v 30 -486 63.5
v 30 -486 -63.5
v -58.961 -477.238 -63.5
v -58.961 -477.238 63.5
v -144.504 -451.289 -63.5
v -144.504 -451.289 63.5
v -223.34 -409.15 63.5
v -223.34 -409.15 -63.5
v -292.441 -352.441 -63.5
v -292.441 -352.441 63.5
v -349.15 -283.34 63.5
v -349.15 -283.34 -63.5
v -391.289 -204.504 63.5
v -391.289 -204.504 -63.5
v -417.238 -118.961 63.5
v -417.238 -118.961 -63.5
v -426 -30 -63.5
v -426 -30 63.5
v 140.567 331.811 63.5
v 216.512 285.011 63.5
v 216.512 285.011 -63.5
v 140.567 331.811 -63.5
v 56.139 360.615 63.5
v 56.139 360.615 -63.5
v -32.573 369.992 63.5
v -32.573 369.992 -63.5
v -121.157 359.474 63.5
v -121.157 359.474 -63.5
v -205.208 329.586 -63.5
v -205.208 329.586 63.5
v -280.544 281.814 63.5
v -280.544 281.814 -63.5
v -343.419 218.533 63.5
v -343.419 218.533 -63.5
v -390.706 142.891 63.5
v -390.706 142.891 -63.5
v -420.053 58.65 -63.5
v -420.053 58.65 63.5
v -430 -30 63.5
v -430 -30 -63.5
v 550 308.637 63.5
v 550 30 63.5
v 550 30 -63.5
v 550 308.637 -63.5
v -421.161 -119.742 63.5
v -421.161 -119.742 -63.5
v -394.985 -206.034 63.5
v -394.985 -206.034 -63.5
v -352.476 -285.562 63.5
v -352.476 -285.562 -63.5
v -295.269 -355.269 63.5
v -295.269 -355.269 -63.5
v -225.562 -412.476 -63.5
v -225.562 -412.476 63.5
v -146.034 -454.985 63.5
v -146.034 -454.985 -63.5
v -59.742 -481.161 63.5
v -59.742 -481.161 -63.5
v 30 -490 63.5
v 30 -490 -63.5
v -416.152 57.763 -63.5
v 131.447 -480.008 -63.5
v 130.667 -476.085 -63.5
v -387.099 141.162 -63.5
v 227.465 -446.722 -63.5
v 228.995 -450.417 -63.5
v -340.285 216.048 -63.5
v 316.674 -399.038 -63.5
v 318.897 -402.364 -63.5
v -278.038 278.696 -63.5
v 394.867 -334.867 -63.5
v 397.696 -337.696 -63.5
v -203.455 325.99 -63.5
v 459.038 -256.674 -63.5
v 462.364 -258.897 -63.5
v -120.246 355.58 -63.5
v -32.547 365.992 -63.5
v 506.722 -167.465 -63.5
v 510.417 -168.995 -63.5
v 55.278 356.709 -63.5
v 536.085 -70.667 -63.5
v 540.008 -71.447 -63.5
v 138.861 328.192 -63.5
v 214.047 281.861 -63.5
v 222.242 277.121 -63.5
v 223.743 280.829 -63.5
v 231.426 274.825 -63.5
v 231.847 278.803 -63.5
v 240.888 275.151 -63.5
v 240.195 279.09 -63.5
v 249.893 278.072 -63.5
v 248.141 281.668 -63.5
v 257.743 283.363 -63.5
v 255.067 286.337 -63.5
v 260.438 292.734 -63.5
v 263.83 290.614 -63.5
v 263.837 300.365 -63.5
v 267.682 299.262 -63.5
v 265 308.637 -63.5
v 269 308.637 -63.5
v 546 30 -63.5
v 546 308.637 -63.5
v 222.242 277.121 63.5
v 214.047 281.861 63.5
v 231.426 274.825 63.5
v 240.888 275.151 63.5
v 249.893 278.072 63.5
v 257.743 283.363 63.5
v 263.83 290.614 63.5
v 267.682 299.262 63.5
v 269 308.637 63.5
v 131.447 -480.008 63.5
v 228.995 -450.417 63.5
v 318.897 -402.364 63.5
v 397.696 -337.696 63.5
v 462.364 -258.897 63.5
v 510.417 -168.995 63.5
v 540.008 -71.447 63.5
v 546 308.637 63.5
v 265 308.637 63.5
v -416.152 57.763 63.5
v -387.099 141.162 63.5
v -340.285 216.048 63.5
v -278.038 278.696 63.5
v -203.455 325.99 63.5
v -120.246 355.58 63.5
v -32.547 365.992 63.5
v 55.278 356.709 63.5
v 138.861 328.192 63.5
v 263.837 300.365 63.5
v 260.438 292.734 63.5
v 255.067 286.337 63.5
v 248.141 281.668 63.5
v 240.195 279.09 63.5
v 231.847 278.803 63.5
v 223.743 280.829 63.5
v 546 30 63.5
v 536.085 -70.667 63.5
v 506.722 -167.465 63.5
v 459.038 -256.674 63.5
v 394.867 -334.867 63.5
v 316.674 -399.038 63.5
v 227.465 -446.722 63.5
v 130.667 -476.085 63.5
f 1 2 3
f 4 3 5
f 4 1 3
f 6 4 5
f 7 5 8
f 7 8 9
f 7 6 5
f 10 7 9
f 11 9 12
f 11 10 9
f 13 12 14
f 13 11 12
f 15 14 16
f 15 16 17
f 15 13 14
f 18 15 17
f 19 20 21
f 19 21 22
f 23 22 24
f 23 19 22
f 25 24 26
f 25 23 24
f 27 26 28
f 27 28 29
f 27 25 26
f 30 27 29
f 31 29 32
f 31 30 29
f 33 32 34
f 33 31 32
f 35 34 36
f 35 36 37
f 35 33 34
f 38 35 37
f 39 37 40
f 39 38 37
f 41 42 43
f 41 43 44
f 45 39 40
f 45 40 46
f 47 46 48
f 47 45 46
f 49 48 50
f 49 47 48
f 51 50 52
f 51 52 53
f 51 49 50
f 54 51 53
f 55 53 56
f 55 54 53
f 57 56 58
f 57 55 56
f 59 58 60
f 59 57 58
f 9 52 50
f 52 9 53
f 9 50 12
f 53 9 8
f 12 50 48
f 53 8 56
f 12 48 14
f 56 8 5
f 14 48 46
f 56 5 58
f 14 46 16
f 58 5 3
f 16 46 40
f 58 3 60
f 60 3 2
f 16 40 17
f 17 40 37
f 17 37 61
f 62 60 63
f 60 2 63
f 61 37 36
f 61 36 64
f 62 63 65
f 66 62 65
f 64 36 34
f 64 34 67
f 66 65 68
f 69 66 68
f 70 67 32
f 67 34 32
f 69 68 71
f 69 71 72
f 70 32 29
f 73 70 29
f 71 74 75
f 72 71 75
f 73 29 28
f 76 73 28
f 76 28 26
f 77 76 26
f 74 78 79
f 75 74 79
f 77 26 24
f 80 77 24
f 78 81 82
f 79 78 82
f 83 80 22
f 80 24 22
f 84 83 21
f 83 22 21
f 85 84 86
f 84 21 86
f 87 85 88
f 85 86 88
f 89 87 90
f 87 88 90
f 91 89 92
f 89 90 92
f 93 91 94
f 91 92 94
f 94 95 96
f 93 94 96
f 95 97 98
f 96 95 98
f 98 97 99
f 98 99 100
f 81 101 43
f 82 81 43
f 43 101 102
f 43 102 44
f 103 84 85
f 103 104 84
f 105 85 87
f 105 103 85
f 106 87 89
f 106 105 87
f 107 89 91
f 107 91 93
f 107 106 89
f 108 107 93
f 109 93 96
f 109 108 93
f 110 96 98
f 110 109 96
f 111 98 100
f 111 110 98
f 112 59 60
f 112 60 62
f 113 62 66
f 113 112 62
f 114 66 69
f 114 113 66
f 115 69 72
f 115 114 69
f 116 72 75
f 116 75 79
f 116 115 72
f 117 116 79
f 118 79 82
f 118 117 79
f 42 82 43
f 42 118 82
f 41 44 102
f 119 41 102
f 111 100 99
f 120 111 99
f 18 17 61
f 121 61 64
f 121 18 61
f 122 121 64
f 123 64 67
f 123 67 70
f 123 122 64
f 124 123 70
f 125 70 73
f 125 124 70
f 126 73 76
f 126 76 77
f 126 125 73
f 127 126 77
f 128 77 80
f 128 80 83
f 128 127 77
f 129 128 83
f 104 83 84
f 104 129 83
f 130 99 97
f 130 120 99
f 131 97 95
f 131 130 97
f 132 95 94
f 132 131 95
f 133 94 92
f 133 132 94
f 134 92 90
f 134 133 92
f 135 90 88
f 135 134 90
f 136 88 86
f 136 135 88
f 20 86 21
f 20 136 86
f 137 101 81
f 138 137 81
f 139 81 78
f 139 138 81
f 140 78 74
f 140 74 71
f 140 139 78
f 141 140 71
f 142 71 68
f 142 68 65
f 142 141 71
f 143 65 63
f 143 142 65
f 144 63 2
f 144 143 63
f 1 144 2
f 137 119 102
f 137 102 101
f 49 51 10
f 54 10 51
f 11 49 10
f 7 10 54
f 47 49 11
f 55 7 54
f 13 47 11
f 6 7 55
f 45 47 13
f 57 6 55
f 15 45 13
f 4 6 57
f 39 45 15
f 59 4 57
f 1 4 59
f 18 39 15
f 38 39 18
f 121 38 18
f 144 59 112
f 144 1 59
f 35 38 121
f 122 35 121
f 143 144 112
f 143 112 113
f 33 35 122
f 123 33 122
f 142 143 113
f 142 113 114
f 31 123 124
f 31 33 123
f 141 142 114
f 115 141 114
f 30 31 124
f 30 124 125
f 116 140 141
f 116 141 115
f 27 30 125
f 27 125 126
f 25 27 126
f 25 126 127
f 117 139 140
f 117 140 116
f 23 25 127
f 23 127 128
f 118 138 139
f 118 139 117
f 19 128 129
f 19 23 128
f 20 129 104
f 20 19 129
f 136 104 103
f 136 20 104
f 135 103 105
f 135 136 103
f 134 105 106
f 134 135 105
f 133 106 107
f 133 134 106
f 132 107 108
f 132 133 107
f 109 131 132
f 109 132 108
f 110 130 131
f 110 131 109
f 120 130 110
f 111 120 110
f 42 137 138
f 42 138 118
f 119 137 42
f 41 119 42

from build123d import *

# Parameters (mm, degrees)
BASE_FLANGE1_DEPTH = 63.5


# Sheet-metal steps are written as plain solids
with BuildPart() as part:
    # Sketch1 → Base-Flange1 (new, symmetric)
    with BuildSketch(Plane.XY):
        with BuildLine():
            ThreePointArc((265, 308.636973764), (248.140563862, 281.667999342), (216.511627907, 285.011138385))
            ThreePointArc((216.511627907, 285.011138385), (-205.207518157, 329.586325632), (-430, -30))
            ThreePointArc((-430, -30), (-295.269119346, -355.269119346), (30, -490))
            ThreePointArc((30, -490), (397.695526217, -337.695526217), (550, 30))
            Line((550, 30), (550, 308.636973764))
            Line((550, 308.636973764), (546, 308.636973764))
            Line((546, 308.636973764), (546, 30))
            ThreePointArc((546, 30), (394.867099092, -334.867099092), (30, -486))
            ThreePointArc((30, -486), (-292.440692221, -352.440692221), (-426, -30))
            ThreePointArc((-426, -30), (-203.455442975, 325.990462376), (214.046511628, 281.861027001))
            ThreePointArc((214.046511628, 281.861027001), (249.892639043, 278.072136085), (269, 308.636973764))
            Line((269, 308.636973764), (265, 308.636973764))
        make_face()
    extrude(amount=BASE_FLANGE1_DEPTH, both=True)


solid = part.part
